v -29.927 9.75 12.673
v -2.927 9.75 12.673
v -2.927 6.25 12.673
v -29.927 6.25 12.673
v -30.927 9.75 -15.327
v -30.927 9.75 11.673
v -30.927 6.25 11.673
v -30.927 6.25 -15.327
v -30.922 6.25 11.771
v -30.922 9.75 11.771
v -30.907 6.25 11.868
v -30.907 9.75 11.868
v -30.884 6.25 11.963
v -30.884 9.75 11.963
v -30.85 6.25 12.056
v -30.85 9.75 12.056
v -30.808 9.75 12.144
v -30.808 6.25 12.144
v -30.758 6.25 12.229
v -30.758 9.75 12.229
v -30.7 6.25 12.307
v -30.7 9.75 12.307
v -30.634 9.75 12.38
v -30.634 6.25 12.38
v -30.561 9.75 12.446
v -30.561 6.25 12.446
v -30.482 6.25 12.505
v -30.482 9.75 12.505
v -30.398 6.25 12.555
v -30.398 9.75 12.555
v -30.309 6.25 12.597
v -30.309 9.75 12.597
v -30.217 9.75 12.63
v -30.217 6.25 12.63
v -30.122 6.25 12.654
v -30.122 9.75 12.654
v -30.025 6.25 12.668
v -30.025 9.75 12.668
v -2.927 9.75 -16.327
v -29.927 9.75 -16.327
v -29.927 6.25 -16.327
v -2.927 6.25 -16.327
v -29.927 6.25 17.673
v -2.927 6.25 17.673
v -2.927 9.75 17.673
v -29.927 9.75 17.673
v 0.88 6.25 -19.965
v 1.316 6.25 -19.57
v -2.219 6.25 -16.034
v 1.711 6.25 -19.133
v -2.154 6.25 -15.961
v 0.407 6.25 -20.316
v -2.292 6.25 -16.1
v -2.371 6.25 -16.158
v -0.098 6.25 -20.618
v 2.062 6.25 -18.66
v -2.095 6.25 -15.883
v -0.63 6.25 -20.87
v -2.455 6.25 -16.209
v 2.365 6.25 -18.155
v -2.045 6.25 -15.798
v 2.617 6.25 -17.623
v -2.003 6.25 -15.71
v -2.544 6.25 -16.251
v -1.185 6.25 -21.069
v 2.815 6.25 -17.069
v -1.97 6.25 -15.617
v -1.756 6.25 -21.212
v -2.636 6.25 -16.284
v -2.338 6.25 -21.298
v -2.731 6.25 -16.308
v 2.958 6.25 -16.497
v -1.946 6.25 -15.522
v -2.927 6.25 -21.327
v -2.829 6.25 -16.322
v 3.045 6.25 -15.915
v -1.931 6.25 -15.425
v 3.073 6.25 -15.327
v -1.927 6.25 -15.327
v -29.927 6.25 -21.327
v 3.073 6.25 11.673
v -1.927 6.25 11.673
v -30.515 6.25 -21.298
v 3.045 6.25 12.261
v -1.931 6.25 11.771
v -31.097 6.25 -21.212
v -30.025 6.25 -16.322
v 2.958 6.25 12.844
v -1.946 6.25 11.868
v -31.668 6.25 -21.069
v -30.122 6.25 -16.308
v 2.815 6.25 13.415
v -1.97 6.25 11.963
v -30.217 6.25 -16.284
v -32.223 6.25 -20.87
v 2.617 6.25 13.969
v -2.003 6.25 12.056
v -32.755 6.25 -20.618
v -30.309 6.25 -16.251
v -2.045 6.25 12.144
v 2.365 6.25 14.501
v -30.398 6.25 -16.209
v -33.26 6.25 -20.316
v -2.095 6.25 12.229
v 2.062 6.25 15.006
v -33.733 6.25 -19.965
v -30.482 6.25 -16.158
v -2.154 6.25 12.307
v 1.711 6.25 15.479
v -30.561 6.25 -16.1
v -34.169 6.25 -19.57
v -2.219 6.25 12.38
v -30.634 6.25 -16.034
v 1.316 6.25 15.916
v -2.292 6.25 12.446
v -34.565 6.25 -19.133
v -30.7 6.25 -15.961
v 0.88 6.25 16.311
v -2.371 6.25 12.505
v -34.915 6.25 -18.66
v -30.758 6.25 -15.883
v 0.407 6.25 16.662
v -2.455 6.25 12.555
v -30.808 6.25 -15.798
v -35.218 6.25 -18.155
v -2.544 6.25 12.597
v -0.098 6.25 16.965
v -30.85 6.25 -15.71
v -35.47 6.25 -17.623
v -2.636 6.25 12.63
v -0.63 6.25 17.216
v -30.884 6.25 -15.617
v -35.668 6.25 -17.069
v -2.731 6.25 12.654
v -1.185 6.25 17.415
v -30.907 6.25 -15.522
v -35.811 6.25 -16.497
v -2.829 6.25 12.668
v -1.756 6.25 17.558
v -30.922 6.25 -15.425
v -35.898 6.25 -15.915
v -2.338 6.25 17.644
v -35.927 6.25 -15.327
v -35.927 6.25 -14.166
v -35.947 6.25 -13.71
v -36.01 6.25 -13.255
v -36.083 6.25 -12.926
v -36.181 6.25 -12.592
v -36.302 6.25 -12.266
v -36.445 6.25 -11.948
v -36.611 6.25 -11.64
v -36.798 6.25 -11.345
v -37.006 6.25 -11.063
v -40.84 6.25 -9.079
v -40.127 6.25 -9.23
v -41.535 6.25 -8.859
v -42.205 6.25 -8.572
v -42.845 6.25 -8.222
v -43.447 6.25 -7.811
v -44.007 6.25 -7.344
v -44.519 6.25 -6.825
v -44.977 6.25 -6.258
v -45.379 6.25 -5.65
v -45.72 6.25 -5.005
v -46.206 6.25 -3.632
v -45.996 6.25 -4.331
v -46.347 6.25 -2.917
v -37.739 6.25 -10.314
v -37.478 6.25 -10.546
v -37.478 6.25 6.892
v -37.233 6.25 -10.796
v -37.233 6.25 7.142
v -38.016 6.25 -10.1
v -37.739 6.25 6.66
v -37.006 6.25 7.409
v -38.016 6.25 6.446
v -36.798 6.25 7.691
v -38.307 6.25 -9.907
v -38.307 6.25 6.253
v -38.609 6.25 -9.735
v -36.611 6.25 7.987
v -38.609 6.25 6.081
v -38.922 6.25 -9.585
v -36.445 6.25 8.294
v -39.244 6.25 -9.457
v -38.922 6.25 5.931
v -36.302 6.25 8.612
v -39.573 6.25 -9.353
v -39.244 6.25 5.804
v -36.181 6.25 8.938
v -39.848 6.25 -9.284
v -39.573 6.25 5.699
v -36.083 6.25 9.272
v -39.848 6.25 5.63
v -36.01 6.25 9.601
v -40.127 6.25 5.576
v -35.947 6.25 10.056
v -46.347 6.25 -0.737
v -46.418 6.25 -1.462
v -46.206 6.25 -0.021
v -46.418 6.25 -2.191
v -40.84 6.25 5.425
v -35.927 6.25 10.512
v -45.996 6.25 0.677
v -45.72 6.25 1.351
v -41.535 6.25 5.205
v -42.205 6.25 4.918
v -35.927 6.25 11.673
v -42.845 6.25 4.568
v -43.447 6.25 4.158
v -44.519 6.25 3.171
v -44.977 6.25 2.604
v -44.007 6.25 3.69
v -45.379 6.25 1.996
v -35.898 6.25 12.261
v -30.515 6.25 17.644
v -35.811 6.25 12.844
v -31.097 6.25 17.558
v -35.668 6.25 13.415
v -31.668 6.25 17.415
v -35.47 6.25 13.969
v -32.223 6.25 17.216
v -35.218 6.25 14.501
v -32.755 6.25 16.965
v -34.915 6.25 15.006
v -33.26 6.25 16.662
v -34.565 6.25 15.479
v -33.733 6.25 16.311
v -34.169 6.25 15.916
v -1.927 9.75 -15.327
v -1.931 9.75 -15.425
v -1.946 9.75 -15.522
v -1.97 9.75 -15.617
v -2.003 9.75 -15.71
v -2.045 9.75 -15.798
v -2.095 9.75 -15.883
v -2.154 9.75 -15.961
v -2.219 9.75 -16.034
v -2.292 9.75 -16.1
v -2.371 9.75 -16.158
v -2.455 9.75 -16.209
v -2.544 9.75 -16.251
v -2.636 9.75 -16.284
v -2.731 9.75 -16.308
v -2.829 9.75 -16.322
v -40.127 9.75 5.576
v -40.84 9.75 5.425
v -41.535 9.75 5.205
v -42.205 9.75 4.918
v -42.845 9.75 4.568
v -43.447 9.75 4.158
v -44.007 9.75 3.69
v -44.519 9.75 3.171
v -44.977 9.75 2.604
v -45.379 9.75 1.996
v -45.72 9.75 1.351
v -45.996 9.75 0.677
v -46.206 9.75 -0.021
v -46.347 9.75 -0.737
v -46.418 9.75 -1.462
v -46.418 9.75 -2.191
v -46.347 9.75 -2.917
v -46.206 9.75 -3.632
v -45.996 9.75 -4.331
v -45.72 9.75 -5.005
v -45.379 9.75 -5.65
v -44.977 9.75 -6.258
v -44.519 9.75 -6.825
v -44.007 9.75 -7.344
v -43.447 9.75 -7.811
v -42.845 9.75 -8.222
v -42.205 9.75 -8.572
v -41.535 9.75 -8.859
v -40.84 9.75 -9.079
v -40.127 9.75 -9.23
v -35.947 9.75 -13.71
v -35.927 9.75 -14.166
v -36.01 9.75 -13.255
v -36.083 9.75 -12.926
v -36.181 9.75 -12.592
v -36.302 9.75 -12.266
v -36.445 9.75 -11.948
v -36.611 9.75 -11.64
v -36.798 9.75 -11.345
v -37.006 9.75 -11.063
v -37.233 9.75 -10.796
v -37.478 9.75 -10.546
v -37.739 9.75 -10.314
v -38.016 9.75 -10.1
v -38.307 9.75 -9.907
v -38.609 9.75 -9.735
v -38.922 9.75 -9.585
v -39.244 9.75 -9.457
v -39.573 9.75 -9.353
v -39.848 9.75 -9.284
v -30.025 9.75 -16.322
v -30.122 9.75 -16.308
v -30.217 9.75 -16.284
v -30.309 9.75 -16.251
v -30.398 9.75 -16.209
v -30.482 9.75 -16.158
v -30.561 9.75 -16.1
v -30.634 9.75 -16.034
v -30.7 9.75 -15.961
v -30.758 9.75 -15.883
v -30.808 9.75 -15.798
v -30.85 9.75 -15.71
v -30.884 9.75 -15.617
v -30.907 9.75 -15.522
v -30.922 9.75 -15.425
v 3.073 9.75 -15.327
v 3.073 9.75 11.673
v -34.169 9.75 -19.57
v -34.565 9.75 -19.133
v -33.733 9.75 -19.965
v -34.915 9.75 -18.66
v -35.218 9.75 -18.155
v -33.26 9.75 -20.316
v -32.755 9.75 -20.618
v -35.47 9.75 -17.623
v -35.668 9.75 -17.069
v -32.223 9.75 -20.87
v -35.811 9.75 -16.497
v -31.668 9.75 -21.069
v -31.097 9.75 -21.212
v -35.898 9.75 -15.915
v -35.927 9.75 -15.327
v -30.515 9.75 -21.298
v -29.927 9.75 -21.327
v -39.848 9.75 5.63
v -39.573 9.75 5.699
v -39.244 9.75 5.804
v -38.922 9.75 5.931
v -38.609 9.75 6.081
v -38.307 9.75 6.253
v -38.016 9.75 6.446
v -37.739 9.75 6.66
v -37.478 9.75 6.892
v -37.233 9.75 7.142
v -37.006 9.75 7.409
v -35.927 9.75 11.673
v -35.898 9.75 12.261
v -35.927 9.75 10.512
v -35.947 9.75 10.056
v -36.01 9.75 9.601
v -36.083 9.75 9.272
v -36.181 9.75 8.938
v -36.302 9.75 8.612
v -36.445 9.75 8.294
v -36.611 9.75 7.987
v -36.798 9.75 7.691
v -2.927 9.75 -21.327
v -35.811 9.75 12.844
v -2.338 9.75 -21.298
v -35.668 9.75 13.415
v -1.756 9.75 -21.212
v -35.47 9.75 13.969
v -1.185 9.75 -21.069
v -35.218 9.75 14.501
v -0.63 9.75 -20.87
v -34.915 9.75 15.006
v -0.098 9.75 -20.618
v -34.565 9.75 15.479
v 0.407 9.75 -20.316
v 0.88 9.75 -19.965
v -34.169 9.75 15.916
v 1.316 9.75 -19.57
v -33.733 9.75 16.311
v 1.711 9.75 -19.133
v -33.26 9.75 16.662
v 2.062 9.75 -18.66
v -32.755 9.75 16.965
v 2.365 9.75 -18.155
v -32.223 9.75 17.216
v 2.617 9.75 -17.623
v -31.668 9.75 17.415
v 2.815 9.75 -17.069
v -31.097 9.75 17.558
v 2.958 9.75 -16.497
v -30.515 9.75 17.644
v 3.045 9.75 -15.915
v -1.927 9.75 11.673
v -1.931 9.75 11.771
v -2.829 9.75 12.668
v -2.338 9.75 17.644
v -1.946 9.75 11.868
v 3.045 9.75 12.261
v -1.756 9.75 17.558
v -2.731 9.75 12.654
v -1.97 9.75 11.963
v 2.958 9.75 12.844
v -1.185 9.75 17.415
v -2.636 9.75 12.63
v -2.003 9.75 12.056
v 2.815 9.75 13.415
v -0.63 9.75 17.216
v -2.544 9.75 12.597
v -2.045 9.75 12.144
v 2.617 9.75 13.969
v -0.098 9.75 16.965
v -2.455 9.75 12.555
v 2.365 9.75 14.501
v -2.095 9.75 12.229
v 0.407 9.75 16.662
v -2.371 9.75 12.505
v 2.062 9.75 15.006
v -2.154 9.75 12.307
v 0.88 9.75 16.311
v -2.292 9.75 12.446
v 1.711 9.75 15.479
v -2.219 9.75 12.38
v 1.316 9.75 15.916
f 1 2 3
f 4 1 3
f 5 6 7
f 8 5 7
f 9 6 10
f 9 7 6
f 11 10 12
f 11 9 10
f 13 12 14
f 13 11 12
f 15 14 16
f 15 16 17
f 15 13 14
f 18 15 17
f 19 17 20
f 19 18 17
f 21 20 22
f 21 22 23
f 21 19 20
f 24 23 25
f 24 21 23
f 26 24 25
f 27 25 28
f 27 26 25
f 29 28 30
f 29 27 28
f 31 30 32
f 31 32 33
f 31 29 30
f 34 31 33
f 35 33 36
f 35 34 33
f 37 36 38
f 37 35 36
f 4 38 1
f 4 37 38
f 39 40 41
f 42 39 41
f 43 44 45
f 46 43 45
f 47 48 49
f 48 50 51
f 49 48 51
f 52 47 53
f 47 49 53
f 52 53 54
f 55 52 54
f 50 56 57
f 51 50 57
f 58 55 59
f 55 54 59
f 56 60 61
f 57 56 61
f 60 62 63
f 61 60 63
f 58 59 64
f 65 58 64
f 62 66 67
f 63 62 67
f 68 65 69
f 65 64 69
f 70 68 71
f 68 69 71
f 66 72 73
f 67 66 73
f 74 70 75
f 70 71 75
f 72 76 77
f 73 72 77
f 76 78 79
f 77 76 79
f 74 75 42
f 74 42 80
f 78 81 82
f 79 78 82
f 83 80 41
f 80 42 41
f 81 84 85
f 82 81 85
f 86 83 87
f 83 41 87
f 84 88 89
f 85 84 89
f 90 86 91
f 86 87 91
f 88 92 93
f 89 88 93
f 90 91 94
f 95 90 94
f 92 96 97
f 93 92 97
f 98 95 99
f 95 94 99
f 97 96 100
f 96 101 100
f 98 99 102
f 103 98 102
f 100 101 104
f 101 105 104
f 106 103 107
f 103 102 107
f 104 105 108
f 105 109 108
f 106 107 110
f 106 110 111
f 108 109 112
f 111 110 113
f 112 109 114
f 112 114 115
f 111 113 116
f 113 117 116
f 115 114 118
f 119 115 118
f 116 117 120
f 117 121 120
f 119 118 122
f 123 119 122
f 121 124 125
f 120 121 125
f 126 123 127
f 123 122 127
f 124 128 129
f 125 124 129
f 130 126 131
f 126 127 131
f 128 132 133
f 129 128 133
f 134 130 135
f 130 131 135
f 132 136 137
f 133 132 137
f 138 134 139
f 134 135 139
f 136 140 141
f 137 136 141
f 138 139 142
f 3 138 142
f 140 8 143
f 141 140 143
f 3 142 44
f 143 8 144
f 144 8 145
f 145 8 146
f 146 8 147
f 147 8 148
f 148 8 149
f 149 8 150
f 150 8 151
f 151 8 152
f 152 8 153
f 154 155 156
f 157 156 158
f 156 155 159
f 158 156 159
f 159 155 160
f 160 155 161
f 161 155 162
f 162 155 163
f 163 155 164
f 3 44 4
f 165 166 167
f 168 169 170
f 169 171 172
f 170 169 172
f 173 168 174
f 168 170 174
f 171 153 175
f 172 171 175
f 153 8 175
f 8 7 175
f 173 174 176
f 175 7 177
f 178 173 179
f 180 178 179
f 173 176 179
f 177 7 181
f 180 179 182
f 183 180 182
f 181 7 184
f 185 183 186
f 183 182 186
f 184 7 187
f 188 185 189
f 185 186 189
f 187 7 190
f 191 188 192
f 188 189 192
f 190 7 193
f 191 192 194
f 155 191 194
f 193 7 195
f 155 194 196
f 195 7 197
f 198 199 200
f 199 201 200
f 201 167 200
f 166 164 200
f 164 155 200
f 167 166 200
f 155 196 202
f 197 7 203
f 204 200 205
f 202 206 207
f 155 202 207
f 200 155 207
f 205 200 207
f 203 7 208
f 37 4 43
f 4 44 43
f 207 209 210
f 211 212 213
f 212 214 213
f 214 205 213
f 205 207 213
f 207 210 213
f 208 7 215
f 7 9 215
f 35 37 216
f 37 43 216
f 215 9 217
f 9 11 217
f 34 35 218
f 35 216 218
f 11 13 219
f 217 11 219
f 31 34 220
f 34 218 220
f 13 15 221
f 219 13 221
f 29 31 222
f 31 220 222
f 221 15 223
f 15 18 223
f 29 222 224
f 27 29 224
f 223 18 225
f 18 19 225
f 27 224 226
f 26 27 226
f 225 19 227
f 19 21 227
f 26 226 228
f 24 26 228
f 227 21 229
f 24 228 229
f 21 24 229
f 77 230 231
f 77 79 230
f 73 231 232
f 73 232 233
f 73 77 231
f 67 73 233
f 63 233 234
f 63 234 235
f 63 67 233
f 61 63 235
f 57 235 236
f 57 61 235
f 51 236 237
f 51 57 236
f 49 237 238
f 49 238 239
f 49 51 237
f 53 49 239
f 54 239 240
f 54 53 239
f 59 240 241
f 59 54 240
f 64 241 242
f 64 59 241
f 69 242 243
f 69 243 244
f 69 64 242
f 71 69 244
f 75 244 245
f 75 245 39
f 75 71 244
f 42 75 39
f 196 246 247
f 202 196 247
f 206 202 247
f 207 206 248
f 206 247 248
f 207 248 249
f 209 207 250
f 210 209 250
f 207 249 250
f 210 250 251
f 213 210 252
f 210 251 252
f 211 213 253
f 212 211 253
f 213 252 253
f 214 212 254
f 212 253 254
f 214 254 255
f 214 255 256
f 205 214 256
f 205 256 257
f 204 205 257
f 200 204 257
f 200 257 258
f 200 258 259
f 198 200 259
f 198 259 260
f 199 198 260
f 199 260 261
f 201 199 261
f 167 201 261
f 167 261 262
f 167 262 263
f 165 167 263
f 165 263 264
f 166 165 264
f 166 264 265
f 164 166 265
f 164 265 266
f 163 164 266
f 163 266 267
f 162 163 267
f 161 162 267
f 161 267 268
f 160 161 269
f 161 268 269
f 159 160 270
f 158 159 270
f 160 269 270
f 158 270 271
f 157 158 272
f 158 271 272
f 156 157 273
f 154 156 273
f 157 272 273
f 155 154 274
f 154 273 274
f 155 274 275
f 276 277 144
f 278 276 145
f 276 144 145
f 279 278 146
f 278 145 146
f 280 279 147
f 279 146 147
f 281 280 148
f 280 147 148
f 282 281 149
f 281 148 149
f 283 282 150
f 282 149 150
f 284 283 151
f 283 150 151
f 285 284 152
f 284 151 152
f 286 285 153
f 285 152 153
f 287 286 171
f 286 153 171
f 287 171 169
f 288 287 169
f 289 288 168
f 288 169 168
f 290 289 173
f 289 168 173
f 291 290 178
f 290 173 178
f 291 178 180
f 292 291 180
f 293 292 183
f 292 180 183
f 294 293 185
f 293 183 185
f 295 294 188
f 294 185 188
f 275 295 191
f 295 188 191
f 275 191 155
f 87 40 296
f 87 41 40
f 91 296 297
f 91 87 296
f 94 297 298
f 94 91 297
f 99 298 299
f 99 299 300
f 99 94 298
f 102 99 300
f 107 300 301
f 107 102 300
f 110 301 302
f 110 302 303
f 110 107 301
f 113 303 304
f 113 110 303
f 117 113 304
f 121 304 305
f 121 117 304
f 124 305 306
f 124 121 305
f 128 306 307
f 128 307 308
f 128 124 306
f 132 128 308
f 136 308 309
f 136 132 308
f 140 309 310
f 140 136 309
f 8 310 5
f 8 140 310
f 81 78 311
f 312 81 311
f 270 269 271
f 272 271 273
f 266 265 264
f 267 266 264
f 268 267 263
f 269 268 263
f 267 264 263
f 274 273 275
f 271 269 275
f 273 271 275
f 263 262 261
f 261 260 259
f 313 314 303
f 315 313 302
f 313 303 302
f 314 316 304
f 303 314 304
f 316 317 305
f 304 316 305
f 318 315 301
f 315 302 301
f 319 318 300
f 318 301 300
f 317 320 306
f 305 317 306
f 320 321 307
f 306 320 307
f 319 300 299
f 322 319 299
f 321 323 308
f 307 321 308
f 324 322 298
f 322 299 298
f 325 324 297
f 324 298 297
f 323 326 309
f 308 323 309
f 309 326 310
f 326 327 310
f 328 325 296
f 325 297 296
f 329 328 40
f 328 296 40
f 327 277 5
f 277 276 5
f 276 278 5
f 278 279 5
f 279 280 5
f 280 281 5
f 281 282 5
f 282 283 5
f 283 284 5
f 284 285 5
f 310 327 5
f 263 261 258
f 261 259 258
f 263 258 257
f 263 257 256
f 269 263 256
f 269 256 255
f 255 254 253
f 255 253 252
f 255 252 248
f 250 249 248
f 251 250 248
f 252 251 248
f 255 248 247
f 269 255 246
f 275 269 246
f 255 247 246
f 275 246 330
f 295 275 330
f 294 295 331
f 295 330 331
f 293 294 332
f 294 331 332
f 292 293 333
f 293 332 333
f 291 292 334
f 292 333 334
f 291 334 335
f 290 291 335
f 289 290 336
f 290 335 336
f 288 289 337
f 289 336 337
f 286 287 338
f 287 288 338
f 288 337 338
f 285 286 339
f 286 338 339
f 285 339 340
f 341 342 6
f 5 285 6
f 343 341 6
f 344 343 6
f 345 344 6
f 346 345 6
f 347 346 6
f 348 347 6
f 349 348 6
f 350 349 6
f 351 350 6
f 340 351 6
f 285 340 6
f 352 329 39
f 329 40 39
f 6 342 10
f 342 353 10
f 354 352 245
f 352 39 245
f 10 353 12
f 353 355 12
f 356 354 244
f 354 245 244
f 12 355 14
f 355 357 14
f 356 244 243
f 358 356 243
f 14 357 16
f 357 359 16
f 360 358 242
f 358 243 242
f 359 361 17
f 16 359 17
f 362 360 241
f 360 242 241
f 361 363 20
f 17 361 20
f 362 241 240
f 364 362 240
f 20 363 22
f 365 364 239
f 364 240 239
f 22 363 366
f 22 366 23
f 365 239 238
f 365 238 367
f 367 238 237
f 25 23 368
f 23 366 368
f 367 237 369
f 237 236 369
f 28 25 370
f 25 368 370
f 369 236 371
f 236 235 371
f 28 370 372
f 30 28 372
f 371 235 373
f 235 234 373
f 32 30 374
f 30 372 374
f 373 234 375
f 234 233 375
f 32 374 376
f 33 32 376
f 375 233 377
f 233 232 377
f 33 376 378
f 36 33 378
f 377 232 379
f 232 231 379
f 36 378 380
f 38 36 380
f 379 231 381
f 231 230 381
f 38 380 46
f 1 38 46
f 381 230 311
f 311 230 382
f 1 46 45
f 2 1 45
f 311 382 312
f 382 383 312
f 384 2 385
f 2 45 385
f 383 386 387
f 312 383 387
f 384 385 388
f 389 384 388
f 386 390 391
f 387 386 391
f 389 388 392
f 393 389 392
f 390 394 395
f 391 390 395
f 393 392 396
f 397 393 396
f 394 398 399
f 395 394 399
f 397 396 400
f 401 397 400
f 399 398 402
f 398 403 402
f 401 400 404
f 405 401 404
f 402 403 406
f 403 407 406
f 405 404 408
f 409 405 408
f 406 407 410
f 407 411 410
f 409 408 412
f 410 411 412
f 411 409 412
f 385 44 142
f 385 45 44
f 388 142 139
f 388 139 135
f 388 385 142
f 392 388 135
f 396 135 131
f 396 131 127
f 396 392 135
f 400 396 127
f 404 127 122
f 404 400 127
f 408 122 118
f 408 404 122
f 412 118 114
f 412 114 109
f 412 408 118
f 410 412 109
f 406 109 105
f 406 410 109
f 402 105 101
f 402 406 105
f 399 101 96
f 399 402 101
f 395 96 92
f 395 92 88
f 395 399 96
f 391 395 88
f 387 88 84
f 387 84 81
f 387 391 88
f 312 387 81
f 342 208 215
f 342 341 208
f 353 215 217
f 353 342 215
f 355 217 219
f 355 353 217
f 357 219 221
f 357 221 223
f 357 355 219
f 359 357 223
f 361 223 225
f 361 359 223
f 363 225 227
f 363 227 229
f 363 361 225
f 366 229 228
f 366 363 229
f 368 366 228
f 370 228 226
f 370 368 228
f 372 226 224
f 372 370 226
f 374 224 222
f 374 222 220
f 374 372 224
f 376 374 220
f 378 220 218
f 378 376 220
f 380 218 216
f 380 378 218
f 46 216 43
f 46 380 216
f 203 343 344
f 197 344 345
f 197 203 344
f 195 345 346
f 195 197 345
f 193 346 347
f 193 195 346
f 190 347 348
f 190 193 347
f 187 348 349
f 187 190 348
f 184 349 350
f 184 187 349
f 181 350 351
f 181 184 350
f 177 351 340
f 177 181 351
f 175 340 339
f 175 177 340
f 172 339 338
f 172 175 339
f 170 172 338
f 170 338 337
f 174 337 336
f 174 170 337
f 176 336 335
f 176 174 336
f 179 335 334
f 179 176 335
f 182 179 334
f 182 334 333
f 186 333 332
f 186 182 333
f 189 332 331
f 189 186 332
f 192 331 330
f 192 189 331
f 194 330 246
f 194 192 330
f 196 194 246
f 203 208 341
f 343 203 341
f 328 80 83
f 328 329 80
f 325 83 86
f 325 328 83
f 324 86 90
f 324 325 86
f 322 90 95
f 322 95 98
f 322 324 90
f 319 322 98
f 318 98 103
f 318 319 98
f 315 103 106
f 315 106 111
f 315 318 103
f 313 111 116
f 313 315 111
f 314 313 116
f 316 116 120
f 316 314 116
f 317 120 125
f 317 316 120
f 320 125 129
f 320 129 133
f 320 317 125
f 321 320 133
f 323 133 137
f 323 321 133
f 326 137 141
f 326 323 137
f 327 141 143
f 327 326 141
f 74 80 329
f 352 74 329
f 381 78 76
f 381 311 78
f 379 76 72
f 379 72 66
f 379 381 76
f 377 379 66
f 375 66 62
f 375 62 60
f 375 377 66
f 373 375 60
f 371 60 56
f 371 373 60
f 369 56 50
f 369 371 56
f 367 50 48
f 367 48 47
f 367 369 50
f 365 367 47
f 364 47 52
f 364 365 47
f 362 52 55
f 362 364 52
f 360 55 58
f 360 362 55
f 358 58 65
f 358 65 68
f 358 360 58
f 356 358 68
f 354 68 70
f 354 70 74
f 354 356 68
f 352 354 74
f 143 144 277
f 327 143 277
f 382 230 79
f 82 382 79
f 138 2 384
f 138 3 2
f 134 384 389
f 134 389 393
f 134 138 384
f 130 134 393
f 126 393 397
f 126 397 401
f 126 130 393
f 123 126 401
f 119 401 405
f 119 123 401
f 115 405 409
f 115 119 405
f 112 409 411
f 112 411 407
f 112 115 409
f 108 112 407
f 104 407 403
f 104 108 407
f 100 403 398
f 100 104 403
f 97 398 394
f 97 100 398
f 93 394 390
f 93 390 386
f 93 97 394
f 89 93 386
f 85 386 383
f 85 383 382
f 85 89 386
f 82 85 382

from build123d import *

# Parameters (mm, degrees)
SKETCH_1_W      = 5
SKETCH_1_H      = 3.5
EXTRUDE_1_DEPTH = 3.5
FILLET_1_R      = 5


with BuildPart() as part:
    # По траектории1: sweep along a path in Эскиз2
    with BuildLine(Plane(origin=(0, 6.25, 0), x_dir=(-1, 0, 0), z_dir=(0, -1, 0))) as sweep_1_path:
        Line((30.926565187, 15.32695004), (30.926565187, -11.67304996))
        ThreePointArc((30.926565187, -11.67304996), (30.633671968, -12.380156741), (29.926565187, -12.67304996))
        Line((29.926565187, -12.67304996), (2.926565187, -12.67304996))
        ThreePointArc((2.926565187, -12.67304996), (2.219458406, -12.380156741), (1.926565187, -11.67304996))
        Line((1.926565187, -11.67304996), (1.926565187, 15.32695004))
        ThreePointArc((1.926565187, 15.32695004), (2.219458406, 16.034056821), (2.926565187, 16.32695004))
        Line((2.926565187, 16.32695004), (29.926565187, 16.32695004))
        ThreePointArc((29.926565187, 16.32695004), (30.633671968, 16.034056821), (30.926565187, 15.32695004))
    # Эскиз1 → По траектории1 (sweep)
    with BuildSketch(Plane(origin=(0.073434813, 0, -1.82695004), x_dir=(1, 0, 0), z_dir=(0, 0, -1))):
        with Locations((-33.5, -8)):
            Rectangle(SKETCH_1_W, SKETCH_1_H)
    sweep(path=sweep_1_path.line)

    # Эскиз3 → Бобышка-Вытянуть1 (add)
    with BuildSketch(Plane(origin=(0, 9.75, 0), x_dir=(1, 0, 0), z_dir=(0, 1, 0))):
        with BuildLine():
            Line((-38.926565187, 9.32695004), (-35.926565187, 9.32695004))
            Line((-35.926565187, 9.32695004), (-35.926565187, -5.67304996))
            Line((-35.926565187, -5.67304996), (-38.926565187, -5.67304996))
            ThreePointArc((-38.926565187, -5.67304996), (-46.426565187, 1.82695004), (-38.926565187, 9.32695004))
        make_face()
    extrude(amount=-EXTRUDE_1_DEPTH)

    # Скругление1
    fillet_1_edges = [part.edges().sort_by_distance(p)[0] for p in [
        (-35.926565187, 8, -9.32695004),
        (-35.926565187, 8, 5.67304996),
    ]]
    fillet(fillet_1_edges, radius=FILLET_1_R)


solid = part.part
